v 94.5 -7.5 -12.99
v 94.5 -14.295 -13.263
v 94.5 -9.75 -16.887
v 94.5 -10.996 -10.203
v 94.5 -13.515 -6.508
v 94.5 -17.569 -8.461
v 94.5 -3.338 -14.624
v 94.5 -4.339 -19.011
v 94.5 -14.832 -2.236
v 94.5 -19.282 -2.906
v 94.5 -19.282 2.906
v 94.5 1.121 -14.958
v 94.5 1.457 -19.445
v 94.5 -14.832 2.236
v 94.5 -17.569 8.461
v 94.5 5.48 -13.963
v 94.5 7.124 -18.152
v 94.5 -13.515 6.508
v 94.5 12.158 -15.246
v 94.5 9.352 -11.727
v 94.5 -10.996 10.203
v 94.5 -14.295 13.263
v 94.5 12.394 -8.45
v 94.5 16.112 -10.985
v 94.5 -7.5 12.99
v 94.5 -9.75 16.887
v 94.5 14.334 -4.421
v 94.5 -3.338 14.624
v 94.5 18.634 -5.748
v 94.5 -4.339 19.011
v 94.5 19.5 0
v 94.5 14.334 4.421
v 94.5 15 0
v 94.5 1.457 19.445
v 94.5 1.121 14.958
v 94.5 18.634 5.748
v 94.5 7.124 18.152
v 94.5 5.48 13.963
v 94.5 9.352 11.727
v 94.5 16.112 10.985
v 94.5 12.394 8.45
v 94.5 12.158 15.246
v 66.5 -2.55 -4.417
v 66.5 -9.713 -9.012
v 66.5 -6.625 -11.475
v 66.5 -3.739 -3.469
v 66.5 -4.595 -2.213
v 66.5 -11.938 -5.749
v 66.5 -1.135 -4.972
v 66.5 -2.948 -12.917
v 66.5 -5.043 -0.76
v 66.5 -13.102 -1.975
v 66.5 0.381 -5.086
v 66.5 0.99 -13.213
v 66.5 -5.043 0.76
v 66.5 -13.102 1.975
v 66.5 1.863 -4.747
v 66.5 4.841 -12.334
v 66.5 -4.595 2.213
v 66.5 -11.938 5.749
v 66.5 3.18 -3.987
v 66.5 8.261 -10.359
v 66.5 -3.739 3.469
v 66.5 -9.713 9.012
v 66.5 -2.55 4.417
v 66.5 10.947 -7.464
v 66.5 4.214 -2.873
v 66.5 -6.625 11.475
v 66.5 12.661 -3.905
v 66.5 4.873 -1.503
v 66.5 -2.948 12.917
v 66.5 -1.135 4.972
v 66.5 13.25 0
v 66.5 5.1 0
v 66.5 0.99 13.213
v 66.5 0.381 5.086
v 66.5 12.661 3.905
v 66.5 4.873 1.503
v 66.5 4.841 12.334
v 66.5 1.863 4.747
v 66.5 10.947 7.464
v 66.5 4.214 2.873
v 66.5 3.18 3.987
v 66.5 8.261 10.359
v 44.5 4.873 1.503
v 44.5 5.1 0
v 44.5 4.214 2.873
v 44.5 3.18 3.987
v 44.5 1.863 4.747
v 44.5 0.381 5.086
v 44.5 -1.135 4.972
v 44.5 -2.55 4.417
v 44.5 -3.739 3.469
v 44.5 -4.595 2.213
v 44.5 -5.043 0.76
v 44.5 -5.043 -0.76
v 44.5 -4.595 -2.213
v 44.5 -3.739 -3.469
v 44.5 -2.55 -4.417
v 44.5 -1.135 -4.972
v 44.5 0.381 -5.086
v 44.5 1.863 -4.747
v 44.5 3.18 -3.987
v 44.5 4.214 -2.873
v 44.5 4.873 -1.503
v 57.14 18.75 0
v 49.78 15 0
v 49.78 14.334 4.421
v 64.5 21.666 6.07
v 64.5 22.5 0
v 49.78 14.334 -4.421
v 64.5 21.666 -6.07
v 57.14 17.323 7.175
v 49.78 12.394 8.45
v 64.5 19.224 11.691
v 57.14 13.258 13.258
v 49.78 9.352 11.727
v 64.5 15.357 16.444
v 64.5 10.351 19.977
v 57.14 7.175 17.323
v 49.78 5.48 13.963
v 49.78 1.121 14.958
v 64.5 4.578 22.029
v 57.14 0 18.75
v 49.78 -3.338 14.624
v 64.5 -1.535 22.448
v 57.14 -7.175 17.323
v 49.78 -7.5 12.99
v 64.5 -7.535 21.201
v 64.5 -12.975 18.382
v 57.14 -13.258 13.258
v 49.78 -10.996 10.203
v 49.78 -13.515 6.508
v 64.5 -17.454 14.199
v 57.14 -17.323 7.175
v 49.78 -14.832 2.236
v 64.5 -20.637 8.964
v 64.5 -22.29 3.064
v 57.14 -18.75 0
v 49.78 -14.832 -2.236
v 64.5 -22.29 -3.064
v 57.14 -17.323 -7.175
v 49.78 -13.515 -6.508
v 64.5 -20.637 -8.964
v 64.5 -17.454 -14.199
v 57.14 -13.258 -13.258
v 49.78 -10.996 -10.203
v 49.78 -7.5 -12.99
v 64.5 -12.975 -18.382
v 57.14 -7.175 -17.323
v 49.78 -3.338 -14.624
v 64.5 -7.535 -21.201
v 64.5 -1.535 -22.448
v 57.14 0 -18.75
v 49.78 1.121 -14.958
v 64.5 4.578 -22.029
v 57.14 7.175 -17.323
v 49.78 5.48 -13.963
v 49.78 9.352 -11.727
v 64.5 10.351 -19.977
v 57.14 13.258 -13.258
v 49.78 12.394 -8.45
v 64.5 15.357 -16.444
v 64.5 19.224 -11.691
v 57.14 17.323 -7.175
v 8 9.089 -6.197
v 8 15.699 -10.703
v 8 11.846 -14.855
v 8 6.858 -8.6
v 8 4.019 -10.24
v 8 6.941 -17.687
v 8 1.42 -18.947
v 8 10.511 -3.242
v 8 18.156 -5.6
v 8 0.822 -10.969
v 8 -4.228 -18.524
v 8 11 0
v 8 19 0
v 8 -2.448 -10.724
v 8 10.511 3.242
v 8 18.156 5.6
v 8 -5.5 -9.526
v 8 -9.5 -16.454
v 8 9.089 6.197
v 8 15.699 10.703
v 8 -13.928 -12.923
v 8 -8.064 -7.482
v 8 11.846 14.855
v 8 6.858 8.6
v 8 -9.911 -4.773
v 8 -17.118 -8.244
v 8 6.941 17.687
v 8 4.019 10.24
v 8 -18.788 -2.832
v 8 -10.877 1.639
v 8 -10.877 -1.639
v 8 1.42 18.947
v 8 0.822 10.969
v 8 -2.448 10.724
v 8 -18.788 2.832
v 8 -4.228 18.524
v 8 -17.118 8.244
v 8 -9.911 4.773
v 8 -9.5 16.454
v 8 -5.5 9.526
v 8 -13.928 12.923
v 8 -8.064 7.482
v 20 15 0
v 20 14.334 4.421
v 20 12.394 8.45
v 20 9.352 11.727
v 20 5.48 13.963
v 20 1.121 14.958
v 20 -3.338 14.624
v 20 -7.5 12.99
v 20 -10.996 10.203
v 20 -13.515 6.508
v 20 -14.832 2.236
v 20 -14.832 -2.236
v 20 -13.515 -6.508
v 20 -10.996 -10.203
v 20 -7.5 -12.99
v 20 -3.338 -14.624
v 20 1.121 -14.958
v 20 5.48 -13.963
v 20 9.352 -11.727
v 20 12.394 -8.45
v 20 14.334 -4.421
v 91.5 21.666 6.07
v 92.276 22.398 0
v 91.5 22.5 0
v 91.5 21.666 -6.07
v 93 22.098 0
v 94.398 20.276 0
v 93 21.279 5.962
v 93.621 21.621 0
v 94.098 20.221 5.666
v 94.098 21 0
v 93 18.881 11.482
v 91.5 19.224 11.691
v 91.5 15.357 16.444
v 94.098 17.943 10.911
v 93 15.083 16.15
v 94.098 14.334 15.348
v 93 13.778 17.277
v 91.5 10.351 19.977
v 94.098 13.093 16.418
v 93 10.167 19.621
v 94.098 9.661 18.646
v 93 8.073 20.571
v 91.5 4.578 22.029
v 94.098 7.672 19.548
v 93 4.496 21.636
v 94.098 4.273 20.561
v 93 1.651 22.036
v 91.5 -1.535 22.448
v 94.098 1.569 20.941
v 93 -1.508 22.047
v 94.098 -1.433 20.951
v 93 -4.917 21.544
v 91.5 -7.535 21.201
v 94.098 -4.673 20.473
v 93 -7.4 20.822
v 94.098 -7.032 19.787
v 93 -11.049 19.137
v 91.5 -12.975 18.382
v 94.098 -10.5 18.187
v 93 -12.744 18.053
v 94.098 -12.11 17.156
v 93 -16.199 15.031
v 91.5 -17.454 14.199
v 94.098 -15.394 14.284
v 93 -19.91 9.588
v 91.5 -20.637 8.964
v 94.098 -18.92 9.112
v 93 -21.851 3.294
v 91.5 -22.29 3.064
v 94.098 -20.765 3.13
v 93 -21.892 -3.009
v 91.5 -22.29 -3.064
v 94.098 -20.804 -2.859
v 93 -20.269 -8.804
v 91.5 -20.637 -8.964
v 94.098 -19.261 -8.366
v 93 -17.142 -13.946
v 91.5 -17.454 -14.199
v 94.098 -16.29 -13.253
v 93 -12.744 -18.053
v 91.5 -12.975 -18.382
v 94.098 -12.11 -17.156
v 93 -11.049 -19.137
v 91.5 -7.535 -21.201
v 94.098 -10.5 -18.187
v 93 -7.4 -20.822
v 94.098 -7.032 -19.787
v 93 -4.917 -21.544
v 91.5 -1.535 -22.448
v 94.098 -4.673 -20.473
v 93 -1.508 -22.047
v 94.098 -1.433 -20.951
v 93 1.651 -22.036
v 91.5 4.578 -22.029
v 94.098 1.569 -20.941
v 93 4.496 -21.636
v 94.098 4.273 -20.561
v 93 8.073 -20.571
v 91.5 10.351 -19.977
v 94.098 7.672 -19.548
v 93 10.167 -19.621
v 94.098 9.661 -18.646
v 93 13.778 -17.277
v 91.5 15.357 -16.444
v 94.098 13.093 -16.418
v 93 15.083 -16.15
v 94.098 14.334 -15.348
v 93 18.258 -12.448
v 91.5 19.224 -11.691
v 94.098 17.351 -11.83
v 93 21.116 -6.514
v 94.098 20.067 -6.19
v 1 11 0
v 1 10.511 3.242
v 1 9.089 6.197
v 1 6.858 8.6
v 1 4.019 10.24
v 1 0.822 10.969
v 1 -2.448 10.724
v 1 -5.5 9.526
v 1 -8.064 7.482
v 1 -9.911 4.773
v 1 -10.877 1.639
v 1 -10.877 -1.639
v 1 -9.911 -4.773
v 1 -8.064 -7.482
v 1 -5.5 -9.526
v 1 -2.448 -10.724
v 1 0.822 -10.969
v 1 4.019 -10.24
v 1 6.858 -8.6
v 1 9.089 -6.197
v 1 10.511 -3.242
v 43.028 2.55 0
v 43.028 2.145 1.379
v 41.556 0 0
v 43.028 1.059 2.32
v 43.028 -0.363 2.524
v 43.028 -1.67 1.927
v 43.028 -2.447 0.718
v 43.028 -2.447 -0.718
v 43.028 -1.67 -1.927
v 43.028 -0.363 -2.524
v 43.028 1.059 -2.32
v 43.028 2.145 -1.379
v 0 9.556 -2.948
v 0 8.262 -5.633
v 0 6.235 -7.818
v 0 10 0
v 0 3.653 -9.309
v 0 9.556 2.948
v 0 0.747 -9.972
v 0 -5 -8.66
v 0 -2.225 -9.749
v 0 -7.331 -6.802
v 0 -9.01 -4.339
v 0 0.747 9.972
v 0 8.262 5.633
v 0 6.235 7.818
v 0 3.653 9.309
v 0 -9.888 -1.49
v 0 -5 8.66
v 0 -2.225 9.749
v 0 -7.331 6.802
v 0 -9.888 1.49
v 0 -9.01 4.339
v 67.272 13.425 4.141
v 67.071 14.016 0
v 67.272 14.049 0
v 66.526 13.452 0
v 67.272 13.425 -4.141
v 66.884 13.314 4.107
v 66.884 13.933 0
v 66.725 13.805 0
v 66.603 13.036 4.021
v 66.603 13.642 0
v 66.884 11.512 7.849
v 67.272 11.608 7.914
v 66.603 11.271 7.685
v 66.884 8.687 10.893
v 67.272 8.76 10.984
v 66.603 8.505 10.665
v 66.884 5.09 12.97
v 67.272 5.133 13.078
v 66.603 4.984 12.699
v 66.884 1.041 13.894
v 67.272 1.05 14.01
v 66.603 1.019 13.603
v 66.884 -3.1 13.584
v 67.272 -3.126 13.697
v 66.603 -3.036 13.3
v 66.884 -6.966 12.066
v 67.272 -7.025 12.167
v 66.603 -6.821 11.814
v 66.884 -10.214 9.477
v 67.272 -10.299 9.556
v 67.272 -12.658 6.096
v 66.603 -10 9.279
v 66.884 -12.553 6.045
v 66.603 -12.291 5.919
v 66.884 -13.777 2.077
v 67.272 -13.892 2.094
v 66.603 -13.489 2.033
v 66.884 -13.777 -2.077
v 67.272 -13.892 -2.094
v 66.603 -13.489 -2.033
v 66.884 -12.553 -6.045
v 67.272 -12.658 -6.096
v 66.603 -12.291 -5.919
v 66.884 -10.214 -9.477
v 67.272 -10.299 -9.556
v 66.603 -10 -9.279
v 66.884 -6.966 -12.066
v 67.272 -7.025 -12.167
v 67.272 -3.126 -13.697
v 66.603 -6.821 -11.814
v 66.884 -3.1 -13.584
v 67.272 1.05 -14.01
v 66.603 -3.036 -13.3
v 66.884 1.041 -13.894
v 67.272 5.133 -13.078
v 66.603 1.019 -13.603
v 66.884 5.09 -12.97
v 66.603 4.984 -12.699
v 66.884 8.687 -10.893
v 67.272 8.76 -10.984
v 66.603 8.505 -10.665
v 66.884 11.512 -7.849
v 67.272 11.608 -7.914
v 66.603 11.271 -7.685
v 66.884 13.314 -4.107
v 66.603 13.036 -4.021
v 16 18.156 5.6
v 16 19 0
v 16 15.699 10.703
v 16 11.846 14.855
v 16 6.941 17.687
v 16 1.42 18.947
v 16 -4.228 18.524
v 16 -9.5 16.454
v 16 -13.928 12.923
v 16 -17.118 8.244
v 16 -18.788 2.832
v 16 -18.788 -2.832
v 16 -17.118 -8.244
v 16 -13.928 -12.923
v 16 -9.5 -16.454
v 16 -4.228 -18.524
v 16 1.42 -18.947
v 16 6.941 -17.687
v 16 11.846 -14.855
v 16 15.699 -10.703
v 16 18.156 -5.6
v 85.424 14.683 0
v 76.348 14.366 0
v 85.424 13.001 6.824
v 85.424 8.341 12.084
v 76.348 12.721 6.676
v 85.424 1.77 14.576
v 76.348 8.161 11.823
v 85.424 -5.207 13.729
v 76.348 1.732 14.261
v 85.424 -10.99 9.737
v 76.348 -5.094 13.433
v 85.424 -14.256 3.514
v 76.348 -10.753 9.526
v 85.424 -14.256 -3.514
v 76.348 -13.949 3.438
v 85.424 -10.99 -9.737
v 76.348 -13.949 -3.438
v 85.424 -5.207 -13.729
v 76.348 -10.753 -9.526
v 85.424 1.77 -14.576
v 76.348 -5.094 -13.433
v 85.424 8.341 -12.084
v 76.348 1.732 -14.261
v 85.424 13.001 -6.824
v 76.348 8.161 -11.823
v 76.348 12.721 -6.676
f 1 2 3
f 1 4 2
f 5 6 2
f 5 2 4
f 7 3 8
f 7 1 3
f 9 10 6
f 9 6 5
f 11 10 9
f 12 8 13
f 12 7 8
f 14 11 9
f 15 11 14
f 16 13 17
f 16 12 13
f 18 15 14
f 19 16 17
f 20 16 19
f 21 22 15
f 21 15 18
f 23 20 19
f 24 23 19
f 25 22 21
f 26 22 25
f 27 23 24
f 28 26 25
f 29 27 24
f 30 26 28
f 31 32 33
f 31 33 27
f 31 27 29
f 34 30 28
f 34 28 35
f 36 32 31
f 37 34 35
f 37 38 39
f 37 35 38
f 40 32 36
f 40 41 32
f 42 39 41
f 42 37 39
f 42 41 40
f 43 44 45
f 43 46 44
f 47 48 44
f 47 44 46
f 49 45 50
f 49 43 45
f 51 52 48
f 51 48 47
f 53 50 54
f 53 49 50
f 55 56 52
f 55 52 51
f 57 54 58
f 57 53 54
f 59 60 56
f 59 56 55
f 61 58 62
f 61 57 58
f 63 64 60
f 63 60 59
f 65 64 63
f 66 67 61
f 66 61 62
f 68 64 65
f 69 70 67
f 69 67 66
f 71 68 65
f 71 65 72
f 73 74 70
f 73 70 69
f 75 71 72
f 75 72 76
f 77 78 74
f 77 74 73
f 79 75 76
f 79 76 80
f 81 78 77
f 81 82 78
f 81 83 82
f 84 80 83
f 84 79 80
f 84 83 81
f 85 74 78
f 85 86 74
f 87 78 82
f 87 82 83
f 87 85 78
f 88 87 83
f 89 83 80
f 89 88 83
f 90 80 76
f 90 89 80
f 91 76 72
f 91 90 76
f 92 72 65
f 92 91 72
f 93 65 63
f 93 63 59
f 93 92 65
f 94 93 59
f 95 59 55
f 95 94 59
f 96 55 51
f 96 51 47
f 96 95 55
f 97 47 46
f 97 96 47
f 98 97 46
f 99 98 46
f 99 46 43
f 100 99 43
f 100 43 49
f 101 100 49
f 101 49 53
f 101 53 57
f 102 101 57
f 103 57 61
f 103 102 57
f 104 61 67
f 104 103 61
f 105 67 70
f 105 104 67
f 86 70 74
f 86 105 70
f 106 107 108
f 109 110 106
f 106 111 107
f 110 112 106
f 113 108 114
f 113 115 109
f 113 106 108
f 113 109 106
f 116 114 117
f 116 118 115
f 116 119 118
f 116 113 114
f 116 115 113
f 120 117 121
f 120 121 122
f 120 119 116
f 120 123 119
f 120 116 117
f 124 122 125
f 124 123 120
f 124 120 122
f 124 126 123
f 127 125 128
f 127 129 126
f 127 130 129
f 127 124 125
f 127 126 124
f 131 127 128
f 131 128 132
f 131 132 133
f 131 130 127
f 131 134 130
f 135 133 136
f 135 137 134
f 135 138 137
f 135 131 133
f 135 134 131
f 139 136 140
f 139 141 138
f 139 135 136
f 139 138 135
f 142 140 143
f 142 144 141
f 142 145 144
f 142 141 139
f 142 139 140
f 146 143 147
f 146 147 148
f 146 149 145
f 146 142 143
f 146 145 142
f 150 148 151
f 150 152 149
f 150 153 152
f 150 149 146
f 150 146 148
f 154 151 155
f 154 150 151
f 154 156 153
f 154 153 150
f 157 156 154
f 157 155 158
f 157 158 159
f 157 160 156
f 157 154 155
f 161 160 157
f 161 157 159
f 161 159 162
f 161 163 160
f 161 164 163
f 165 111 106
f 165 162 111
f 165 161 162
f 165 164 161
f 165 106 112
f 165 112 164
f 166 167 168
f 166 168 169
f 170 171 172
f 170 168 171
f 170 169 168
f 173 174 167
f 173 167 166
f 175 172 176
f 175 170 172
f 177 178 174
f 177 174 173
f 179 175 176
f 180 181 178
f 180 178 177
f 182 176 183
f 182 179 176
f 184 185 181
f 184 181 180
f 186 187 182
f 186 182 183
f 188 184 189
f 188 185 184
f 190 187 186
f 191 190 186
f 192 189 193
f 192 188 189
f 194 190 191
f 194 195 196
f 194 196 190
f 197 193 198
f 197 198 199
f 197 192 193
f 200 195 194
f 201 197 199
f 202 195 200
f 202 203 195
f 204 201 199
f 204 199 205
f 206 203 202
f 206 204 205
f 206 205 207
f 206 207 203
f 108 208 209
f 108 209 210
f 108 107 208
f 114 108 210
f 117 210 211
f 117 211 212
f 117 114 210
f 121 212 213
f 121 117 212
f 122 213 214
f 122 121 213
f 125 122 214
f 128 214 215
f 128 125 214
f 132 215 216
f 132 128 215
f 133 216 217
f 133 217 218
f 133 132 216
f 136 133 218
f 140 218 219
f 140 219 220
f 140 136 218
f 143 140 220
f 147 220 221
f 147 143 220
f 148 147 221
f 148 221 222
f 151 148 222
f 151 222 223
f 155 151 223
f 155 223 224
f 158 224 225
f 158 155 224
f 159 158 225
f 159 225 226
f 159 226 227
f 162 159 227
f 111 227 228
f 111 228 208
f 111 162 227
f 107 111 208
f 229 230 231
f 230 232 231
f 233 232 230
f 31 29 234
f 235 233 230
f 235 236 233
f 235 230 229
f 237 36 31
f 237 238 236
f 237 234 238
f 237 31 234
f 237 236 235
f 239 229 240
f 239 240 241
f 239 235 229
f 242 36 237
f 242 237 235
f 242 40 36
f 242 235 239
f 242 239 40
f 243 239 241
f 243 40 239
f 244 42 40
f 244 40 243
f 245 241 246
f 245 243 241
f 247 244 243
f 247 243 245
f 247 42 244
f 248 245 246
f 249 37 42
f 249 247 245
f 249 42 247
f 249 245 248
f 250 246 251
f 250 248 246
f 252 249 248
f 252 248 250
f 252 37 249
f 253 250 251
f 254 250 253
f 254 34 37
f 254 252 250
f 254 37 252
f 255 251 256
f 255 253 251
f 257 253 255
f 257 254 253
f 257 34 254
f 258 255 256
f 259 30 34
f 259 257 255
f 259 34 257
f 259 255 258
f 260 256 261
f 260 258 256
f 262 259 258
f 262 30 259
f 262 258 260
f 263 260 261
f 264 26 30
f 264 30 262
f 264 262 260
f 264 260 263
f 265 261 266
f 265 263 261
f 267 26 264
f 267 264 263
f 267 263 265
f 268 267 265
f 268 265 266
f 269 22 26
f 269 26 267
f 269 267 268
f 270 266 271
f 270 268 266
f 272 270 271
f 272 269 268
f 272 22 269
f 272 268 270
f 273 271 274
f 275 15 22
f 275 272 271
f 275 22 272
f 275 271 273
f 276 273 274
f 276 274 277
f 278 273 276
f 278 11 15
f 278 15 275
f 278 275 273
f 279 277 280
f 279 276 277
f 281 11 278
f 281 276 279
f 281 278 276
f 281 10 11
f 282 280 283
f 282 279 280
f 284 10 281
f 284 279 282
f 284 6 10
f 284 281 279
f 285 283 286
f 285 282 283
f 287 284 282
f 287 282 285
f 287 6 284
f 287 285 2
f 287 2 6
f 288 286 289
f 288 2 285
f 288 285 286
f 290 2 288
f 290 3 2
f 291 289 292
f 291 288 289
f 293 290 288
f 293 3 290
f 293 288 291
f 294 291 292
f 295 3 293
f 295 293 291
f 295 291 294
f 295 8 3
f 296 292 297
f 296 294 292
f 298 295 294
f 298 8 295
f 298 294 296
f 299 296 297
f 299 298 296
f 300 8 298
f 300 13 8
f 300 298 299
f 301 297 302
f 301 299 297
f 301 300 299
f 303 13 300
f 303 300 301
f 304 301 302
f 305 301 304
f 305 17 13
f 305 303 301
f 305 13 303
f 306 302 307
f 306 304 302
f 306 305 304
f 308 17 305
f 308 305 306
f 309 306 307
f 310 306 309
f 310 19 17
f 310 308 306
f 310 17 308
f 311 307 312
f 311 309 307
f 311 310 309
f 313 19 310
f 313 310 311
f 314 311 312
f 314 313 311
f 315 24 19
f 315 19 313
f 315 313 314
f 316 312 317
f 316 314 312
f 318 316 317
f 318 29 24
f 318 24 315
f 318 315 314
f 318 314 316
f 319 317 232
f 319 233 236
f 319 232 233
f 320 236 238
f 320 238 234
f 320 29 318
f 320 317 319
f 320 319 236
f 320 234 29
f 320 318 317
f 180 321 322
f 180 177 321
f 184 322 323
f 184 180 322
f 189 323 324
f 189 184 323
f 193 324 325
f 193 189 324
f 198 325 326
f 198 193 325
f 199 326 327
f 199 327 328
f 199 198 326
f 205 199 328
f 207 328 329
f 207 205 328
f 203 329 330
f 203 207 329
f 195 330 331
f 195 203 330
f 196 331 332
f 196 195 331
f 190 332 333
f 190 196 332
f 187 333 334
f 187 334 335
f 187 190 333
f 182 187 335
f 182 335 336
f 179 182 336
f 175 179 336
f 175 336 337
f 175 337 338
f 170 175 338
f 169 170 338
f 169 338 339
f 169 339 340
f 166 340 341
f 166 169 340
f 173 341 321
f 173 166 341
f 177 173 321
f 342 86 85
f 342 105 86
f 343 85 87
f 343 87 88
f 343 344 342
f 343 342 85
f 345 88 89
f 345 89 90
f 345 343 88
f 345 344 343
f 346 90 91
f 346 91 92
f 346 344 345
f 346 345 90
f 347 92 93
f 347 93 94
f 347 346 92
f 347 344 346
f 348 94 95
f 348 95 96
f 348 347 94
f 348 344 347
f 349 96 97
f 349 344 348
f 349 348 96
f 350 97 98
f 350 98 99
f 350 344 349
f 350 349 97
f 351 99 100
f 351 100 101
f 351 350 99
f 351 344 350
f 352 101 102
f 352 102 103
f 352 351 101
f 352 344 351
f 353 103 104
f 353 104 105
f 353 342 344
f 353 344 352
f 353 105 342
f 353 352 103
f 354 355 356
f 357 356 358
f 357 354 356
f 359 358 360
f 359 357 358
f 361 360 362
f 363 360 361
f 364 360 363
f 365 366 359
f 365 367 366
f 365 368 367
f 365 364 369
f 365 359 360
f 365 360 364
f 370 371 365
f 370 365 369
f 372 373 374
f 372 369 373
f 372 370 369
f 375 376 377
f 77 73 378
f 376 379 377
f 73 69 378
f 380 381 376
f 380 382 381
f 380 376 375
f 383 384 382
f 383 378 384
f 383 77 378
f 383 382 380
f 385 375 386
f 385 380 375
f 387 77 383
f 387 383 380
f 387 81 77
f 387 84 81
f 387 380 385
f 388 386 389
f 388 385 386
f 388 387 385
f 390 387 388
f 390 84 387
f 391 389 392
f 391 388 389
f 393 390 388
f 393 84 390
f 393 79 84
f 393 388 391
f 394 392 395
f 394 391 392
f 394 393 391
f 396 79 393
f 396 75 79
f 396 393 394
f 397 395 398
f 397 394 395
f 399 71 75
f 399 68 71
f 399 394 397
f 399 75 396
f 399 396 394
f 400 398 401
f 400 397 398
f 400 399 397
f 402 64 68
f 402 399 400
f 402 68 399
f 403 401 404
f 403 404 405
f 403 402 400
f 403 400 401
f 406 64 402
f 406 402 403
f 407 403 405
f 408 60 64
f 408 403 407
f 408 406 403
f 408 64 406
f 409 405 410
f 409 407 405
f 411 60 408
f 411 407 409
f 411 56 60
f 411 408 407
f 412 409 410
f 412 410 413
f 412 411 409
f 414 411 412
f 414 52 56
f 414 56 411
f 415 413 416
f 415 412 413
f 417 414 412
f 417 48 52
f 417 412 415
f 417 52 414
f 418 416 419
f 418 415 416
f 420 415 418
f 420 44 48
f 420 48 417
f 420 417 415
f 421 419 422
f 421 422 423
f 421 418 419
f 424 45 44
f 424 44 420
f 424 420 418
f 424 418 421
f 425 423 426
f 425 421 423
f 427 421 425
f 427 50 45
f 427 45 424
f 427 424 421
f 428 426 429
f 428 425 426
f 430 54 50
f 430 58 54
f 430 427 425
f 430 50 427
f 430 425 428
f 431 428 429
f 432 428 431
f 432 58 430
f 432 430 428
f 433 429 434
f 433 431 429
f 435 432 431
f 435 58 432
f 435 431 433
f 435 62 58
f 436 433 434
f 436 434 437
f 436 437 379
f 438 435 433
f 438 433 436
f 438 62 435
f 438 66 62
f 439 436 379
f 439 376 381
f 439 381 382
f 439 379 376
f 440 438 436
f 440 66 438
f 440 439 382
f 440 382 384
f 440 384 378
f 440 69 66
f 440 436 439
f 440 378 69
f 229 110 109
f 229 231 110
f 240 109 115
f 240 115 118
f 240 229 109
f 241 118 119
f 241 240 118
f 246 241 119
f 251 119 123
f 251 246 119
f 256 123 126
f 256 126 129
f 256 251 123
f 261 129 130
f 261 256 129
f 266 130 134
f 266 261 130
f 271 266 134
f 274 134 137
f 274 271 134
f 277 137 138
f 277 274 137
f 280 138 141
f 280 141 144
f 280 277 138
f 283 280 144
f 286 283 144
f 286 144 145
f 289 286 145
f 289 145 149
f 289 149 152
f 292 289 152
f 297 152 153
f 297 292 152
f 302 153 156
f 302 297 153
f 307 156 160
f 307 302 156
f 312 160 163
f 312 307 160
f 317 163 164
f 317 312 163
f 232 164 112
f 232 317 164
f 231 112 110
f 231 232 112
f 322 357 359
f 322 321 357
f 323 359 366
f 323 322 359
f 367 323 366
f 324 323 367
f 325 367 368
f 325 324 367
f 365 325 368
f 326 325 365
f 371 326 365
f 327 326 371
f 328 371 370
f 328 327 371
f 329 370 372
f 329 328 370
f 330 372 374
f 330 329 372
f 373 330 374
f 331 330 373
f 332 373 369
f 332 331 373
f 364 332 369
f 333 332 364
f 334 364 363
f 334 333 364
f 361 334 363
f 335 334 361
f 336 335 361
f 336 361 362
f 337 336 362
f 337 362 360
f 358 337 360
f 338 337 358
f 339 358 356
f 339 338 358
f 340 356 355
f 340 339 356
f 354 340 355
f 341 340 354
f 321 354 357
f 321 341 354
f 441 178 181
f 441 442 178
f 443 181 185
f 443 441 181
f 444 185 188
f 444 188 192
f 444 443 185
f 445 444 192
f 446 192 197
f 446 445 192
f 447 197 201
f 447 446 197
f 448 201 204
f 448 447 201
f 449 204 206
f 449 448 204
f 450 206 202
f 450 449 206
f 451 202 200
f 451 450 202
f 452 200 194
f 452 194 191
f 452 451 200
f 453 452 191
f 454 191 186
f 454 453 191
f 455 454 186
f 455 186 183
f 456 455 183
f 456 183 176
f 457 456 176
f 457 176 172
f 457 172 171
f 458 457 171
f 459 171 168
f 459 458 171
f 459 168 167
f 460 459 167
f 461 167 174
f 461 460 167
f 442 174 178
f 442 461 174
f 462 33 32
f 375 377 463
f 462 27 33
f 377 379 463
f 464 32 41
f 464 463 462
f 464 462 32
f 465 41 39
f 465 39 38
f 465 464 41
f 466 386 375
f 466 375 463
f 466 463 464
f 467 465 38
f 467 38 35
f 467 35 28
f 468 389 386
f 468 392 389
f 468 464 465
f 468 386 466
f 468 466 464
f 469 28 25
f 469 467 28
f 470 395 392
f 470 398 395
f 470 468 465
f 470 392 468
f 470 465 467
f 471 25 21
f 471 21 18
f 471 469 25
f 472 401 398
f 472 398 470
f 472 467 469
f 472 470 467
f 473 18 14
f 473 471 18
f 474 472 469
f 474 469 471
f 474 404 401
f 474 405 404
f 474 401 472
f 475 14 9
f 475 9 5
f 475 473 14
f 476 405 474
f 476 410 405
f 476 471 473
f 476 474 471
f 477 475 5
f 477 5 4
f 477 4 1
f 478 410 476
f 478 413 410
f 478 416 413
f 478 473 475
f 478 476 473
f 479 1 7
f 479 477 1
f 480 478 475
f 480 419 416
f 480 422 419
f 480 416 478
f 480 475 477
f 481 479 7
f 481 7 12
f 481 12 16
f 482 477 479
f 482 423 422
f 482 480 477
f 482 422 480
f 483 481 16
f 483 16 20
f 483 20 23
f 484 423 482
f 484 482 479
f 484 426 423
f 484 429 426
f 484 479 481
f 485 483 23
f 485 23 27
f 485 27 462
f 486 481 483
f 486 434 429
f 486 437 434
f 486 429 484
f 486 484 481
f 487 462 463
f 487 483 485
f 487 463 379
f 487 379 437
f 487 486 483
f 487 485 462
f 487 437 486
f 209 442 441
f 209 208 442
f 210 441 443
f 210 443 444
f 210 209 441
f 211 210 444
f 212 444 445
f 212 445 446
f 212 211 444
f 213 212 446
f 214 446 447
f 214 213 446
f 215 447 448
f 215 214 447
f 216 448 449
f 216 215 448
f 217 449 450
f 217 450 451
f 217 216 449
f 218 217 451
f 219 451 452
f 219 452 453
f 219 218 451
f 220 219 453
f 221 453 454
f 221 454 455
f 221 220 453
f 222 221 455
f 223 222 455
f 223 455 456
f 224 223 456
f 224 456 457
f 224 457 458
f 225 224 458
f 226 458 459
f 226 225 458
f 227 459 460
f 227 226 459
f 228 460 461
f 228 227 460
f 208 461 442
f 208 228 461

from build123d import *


with BuildPart() as part:
    # Sketch1 → Revolve1 (revolve)
    with BuildSketch(Plane.XY):
        with BuildLine():
            Line((44.5, 5.1), (41.555513627, 0))
            Line((41.555513627, 0), (0, 0))
            Line((0, 0), (0, 10))
            Line((0, 10), (1, 11))
            Line((1, 11), (8, 11))
            Line((8, 11), (8, 19))
            Line((8, 19), (16, 19))
            Line((16, 19), (20, 15))
            Line((20, 15), (49.780421209, 15))
            Line((49.780421209, 15), (64.5, 22.5))
            Line((64.5, 22.5), (91.5, 22.5))
            ThreePointArc((91.5, 22.5), (93.621320344, 21.621320344), (94.5, 19.5))
            Line((94.5, 19.5), (94.5, 15))
            Line((94.5, 15), (67.272080403, 14.049180096))
            ThreePointArc((67.272080403, 14.049180096), (66.72452816, 13.805394131), (66.5, 13.249667434))
            Line((66.5, 13.249667434), (66.5, 5.1))
            Line((66.5, 5.1), (44.5, 5.1))
        make_face()
    revolve(axis=Axis((0, 0, 0), (1, 0, 0)))


solid = part.part
